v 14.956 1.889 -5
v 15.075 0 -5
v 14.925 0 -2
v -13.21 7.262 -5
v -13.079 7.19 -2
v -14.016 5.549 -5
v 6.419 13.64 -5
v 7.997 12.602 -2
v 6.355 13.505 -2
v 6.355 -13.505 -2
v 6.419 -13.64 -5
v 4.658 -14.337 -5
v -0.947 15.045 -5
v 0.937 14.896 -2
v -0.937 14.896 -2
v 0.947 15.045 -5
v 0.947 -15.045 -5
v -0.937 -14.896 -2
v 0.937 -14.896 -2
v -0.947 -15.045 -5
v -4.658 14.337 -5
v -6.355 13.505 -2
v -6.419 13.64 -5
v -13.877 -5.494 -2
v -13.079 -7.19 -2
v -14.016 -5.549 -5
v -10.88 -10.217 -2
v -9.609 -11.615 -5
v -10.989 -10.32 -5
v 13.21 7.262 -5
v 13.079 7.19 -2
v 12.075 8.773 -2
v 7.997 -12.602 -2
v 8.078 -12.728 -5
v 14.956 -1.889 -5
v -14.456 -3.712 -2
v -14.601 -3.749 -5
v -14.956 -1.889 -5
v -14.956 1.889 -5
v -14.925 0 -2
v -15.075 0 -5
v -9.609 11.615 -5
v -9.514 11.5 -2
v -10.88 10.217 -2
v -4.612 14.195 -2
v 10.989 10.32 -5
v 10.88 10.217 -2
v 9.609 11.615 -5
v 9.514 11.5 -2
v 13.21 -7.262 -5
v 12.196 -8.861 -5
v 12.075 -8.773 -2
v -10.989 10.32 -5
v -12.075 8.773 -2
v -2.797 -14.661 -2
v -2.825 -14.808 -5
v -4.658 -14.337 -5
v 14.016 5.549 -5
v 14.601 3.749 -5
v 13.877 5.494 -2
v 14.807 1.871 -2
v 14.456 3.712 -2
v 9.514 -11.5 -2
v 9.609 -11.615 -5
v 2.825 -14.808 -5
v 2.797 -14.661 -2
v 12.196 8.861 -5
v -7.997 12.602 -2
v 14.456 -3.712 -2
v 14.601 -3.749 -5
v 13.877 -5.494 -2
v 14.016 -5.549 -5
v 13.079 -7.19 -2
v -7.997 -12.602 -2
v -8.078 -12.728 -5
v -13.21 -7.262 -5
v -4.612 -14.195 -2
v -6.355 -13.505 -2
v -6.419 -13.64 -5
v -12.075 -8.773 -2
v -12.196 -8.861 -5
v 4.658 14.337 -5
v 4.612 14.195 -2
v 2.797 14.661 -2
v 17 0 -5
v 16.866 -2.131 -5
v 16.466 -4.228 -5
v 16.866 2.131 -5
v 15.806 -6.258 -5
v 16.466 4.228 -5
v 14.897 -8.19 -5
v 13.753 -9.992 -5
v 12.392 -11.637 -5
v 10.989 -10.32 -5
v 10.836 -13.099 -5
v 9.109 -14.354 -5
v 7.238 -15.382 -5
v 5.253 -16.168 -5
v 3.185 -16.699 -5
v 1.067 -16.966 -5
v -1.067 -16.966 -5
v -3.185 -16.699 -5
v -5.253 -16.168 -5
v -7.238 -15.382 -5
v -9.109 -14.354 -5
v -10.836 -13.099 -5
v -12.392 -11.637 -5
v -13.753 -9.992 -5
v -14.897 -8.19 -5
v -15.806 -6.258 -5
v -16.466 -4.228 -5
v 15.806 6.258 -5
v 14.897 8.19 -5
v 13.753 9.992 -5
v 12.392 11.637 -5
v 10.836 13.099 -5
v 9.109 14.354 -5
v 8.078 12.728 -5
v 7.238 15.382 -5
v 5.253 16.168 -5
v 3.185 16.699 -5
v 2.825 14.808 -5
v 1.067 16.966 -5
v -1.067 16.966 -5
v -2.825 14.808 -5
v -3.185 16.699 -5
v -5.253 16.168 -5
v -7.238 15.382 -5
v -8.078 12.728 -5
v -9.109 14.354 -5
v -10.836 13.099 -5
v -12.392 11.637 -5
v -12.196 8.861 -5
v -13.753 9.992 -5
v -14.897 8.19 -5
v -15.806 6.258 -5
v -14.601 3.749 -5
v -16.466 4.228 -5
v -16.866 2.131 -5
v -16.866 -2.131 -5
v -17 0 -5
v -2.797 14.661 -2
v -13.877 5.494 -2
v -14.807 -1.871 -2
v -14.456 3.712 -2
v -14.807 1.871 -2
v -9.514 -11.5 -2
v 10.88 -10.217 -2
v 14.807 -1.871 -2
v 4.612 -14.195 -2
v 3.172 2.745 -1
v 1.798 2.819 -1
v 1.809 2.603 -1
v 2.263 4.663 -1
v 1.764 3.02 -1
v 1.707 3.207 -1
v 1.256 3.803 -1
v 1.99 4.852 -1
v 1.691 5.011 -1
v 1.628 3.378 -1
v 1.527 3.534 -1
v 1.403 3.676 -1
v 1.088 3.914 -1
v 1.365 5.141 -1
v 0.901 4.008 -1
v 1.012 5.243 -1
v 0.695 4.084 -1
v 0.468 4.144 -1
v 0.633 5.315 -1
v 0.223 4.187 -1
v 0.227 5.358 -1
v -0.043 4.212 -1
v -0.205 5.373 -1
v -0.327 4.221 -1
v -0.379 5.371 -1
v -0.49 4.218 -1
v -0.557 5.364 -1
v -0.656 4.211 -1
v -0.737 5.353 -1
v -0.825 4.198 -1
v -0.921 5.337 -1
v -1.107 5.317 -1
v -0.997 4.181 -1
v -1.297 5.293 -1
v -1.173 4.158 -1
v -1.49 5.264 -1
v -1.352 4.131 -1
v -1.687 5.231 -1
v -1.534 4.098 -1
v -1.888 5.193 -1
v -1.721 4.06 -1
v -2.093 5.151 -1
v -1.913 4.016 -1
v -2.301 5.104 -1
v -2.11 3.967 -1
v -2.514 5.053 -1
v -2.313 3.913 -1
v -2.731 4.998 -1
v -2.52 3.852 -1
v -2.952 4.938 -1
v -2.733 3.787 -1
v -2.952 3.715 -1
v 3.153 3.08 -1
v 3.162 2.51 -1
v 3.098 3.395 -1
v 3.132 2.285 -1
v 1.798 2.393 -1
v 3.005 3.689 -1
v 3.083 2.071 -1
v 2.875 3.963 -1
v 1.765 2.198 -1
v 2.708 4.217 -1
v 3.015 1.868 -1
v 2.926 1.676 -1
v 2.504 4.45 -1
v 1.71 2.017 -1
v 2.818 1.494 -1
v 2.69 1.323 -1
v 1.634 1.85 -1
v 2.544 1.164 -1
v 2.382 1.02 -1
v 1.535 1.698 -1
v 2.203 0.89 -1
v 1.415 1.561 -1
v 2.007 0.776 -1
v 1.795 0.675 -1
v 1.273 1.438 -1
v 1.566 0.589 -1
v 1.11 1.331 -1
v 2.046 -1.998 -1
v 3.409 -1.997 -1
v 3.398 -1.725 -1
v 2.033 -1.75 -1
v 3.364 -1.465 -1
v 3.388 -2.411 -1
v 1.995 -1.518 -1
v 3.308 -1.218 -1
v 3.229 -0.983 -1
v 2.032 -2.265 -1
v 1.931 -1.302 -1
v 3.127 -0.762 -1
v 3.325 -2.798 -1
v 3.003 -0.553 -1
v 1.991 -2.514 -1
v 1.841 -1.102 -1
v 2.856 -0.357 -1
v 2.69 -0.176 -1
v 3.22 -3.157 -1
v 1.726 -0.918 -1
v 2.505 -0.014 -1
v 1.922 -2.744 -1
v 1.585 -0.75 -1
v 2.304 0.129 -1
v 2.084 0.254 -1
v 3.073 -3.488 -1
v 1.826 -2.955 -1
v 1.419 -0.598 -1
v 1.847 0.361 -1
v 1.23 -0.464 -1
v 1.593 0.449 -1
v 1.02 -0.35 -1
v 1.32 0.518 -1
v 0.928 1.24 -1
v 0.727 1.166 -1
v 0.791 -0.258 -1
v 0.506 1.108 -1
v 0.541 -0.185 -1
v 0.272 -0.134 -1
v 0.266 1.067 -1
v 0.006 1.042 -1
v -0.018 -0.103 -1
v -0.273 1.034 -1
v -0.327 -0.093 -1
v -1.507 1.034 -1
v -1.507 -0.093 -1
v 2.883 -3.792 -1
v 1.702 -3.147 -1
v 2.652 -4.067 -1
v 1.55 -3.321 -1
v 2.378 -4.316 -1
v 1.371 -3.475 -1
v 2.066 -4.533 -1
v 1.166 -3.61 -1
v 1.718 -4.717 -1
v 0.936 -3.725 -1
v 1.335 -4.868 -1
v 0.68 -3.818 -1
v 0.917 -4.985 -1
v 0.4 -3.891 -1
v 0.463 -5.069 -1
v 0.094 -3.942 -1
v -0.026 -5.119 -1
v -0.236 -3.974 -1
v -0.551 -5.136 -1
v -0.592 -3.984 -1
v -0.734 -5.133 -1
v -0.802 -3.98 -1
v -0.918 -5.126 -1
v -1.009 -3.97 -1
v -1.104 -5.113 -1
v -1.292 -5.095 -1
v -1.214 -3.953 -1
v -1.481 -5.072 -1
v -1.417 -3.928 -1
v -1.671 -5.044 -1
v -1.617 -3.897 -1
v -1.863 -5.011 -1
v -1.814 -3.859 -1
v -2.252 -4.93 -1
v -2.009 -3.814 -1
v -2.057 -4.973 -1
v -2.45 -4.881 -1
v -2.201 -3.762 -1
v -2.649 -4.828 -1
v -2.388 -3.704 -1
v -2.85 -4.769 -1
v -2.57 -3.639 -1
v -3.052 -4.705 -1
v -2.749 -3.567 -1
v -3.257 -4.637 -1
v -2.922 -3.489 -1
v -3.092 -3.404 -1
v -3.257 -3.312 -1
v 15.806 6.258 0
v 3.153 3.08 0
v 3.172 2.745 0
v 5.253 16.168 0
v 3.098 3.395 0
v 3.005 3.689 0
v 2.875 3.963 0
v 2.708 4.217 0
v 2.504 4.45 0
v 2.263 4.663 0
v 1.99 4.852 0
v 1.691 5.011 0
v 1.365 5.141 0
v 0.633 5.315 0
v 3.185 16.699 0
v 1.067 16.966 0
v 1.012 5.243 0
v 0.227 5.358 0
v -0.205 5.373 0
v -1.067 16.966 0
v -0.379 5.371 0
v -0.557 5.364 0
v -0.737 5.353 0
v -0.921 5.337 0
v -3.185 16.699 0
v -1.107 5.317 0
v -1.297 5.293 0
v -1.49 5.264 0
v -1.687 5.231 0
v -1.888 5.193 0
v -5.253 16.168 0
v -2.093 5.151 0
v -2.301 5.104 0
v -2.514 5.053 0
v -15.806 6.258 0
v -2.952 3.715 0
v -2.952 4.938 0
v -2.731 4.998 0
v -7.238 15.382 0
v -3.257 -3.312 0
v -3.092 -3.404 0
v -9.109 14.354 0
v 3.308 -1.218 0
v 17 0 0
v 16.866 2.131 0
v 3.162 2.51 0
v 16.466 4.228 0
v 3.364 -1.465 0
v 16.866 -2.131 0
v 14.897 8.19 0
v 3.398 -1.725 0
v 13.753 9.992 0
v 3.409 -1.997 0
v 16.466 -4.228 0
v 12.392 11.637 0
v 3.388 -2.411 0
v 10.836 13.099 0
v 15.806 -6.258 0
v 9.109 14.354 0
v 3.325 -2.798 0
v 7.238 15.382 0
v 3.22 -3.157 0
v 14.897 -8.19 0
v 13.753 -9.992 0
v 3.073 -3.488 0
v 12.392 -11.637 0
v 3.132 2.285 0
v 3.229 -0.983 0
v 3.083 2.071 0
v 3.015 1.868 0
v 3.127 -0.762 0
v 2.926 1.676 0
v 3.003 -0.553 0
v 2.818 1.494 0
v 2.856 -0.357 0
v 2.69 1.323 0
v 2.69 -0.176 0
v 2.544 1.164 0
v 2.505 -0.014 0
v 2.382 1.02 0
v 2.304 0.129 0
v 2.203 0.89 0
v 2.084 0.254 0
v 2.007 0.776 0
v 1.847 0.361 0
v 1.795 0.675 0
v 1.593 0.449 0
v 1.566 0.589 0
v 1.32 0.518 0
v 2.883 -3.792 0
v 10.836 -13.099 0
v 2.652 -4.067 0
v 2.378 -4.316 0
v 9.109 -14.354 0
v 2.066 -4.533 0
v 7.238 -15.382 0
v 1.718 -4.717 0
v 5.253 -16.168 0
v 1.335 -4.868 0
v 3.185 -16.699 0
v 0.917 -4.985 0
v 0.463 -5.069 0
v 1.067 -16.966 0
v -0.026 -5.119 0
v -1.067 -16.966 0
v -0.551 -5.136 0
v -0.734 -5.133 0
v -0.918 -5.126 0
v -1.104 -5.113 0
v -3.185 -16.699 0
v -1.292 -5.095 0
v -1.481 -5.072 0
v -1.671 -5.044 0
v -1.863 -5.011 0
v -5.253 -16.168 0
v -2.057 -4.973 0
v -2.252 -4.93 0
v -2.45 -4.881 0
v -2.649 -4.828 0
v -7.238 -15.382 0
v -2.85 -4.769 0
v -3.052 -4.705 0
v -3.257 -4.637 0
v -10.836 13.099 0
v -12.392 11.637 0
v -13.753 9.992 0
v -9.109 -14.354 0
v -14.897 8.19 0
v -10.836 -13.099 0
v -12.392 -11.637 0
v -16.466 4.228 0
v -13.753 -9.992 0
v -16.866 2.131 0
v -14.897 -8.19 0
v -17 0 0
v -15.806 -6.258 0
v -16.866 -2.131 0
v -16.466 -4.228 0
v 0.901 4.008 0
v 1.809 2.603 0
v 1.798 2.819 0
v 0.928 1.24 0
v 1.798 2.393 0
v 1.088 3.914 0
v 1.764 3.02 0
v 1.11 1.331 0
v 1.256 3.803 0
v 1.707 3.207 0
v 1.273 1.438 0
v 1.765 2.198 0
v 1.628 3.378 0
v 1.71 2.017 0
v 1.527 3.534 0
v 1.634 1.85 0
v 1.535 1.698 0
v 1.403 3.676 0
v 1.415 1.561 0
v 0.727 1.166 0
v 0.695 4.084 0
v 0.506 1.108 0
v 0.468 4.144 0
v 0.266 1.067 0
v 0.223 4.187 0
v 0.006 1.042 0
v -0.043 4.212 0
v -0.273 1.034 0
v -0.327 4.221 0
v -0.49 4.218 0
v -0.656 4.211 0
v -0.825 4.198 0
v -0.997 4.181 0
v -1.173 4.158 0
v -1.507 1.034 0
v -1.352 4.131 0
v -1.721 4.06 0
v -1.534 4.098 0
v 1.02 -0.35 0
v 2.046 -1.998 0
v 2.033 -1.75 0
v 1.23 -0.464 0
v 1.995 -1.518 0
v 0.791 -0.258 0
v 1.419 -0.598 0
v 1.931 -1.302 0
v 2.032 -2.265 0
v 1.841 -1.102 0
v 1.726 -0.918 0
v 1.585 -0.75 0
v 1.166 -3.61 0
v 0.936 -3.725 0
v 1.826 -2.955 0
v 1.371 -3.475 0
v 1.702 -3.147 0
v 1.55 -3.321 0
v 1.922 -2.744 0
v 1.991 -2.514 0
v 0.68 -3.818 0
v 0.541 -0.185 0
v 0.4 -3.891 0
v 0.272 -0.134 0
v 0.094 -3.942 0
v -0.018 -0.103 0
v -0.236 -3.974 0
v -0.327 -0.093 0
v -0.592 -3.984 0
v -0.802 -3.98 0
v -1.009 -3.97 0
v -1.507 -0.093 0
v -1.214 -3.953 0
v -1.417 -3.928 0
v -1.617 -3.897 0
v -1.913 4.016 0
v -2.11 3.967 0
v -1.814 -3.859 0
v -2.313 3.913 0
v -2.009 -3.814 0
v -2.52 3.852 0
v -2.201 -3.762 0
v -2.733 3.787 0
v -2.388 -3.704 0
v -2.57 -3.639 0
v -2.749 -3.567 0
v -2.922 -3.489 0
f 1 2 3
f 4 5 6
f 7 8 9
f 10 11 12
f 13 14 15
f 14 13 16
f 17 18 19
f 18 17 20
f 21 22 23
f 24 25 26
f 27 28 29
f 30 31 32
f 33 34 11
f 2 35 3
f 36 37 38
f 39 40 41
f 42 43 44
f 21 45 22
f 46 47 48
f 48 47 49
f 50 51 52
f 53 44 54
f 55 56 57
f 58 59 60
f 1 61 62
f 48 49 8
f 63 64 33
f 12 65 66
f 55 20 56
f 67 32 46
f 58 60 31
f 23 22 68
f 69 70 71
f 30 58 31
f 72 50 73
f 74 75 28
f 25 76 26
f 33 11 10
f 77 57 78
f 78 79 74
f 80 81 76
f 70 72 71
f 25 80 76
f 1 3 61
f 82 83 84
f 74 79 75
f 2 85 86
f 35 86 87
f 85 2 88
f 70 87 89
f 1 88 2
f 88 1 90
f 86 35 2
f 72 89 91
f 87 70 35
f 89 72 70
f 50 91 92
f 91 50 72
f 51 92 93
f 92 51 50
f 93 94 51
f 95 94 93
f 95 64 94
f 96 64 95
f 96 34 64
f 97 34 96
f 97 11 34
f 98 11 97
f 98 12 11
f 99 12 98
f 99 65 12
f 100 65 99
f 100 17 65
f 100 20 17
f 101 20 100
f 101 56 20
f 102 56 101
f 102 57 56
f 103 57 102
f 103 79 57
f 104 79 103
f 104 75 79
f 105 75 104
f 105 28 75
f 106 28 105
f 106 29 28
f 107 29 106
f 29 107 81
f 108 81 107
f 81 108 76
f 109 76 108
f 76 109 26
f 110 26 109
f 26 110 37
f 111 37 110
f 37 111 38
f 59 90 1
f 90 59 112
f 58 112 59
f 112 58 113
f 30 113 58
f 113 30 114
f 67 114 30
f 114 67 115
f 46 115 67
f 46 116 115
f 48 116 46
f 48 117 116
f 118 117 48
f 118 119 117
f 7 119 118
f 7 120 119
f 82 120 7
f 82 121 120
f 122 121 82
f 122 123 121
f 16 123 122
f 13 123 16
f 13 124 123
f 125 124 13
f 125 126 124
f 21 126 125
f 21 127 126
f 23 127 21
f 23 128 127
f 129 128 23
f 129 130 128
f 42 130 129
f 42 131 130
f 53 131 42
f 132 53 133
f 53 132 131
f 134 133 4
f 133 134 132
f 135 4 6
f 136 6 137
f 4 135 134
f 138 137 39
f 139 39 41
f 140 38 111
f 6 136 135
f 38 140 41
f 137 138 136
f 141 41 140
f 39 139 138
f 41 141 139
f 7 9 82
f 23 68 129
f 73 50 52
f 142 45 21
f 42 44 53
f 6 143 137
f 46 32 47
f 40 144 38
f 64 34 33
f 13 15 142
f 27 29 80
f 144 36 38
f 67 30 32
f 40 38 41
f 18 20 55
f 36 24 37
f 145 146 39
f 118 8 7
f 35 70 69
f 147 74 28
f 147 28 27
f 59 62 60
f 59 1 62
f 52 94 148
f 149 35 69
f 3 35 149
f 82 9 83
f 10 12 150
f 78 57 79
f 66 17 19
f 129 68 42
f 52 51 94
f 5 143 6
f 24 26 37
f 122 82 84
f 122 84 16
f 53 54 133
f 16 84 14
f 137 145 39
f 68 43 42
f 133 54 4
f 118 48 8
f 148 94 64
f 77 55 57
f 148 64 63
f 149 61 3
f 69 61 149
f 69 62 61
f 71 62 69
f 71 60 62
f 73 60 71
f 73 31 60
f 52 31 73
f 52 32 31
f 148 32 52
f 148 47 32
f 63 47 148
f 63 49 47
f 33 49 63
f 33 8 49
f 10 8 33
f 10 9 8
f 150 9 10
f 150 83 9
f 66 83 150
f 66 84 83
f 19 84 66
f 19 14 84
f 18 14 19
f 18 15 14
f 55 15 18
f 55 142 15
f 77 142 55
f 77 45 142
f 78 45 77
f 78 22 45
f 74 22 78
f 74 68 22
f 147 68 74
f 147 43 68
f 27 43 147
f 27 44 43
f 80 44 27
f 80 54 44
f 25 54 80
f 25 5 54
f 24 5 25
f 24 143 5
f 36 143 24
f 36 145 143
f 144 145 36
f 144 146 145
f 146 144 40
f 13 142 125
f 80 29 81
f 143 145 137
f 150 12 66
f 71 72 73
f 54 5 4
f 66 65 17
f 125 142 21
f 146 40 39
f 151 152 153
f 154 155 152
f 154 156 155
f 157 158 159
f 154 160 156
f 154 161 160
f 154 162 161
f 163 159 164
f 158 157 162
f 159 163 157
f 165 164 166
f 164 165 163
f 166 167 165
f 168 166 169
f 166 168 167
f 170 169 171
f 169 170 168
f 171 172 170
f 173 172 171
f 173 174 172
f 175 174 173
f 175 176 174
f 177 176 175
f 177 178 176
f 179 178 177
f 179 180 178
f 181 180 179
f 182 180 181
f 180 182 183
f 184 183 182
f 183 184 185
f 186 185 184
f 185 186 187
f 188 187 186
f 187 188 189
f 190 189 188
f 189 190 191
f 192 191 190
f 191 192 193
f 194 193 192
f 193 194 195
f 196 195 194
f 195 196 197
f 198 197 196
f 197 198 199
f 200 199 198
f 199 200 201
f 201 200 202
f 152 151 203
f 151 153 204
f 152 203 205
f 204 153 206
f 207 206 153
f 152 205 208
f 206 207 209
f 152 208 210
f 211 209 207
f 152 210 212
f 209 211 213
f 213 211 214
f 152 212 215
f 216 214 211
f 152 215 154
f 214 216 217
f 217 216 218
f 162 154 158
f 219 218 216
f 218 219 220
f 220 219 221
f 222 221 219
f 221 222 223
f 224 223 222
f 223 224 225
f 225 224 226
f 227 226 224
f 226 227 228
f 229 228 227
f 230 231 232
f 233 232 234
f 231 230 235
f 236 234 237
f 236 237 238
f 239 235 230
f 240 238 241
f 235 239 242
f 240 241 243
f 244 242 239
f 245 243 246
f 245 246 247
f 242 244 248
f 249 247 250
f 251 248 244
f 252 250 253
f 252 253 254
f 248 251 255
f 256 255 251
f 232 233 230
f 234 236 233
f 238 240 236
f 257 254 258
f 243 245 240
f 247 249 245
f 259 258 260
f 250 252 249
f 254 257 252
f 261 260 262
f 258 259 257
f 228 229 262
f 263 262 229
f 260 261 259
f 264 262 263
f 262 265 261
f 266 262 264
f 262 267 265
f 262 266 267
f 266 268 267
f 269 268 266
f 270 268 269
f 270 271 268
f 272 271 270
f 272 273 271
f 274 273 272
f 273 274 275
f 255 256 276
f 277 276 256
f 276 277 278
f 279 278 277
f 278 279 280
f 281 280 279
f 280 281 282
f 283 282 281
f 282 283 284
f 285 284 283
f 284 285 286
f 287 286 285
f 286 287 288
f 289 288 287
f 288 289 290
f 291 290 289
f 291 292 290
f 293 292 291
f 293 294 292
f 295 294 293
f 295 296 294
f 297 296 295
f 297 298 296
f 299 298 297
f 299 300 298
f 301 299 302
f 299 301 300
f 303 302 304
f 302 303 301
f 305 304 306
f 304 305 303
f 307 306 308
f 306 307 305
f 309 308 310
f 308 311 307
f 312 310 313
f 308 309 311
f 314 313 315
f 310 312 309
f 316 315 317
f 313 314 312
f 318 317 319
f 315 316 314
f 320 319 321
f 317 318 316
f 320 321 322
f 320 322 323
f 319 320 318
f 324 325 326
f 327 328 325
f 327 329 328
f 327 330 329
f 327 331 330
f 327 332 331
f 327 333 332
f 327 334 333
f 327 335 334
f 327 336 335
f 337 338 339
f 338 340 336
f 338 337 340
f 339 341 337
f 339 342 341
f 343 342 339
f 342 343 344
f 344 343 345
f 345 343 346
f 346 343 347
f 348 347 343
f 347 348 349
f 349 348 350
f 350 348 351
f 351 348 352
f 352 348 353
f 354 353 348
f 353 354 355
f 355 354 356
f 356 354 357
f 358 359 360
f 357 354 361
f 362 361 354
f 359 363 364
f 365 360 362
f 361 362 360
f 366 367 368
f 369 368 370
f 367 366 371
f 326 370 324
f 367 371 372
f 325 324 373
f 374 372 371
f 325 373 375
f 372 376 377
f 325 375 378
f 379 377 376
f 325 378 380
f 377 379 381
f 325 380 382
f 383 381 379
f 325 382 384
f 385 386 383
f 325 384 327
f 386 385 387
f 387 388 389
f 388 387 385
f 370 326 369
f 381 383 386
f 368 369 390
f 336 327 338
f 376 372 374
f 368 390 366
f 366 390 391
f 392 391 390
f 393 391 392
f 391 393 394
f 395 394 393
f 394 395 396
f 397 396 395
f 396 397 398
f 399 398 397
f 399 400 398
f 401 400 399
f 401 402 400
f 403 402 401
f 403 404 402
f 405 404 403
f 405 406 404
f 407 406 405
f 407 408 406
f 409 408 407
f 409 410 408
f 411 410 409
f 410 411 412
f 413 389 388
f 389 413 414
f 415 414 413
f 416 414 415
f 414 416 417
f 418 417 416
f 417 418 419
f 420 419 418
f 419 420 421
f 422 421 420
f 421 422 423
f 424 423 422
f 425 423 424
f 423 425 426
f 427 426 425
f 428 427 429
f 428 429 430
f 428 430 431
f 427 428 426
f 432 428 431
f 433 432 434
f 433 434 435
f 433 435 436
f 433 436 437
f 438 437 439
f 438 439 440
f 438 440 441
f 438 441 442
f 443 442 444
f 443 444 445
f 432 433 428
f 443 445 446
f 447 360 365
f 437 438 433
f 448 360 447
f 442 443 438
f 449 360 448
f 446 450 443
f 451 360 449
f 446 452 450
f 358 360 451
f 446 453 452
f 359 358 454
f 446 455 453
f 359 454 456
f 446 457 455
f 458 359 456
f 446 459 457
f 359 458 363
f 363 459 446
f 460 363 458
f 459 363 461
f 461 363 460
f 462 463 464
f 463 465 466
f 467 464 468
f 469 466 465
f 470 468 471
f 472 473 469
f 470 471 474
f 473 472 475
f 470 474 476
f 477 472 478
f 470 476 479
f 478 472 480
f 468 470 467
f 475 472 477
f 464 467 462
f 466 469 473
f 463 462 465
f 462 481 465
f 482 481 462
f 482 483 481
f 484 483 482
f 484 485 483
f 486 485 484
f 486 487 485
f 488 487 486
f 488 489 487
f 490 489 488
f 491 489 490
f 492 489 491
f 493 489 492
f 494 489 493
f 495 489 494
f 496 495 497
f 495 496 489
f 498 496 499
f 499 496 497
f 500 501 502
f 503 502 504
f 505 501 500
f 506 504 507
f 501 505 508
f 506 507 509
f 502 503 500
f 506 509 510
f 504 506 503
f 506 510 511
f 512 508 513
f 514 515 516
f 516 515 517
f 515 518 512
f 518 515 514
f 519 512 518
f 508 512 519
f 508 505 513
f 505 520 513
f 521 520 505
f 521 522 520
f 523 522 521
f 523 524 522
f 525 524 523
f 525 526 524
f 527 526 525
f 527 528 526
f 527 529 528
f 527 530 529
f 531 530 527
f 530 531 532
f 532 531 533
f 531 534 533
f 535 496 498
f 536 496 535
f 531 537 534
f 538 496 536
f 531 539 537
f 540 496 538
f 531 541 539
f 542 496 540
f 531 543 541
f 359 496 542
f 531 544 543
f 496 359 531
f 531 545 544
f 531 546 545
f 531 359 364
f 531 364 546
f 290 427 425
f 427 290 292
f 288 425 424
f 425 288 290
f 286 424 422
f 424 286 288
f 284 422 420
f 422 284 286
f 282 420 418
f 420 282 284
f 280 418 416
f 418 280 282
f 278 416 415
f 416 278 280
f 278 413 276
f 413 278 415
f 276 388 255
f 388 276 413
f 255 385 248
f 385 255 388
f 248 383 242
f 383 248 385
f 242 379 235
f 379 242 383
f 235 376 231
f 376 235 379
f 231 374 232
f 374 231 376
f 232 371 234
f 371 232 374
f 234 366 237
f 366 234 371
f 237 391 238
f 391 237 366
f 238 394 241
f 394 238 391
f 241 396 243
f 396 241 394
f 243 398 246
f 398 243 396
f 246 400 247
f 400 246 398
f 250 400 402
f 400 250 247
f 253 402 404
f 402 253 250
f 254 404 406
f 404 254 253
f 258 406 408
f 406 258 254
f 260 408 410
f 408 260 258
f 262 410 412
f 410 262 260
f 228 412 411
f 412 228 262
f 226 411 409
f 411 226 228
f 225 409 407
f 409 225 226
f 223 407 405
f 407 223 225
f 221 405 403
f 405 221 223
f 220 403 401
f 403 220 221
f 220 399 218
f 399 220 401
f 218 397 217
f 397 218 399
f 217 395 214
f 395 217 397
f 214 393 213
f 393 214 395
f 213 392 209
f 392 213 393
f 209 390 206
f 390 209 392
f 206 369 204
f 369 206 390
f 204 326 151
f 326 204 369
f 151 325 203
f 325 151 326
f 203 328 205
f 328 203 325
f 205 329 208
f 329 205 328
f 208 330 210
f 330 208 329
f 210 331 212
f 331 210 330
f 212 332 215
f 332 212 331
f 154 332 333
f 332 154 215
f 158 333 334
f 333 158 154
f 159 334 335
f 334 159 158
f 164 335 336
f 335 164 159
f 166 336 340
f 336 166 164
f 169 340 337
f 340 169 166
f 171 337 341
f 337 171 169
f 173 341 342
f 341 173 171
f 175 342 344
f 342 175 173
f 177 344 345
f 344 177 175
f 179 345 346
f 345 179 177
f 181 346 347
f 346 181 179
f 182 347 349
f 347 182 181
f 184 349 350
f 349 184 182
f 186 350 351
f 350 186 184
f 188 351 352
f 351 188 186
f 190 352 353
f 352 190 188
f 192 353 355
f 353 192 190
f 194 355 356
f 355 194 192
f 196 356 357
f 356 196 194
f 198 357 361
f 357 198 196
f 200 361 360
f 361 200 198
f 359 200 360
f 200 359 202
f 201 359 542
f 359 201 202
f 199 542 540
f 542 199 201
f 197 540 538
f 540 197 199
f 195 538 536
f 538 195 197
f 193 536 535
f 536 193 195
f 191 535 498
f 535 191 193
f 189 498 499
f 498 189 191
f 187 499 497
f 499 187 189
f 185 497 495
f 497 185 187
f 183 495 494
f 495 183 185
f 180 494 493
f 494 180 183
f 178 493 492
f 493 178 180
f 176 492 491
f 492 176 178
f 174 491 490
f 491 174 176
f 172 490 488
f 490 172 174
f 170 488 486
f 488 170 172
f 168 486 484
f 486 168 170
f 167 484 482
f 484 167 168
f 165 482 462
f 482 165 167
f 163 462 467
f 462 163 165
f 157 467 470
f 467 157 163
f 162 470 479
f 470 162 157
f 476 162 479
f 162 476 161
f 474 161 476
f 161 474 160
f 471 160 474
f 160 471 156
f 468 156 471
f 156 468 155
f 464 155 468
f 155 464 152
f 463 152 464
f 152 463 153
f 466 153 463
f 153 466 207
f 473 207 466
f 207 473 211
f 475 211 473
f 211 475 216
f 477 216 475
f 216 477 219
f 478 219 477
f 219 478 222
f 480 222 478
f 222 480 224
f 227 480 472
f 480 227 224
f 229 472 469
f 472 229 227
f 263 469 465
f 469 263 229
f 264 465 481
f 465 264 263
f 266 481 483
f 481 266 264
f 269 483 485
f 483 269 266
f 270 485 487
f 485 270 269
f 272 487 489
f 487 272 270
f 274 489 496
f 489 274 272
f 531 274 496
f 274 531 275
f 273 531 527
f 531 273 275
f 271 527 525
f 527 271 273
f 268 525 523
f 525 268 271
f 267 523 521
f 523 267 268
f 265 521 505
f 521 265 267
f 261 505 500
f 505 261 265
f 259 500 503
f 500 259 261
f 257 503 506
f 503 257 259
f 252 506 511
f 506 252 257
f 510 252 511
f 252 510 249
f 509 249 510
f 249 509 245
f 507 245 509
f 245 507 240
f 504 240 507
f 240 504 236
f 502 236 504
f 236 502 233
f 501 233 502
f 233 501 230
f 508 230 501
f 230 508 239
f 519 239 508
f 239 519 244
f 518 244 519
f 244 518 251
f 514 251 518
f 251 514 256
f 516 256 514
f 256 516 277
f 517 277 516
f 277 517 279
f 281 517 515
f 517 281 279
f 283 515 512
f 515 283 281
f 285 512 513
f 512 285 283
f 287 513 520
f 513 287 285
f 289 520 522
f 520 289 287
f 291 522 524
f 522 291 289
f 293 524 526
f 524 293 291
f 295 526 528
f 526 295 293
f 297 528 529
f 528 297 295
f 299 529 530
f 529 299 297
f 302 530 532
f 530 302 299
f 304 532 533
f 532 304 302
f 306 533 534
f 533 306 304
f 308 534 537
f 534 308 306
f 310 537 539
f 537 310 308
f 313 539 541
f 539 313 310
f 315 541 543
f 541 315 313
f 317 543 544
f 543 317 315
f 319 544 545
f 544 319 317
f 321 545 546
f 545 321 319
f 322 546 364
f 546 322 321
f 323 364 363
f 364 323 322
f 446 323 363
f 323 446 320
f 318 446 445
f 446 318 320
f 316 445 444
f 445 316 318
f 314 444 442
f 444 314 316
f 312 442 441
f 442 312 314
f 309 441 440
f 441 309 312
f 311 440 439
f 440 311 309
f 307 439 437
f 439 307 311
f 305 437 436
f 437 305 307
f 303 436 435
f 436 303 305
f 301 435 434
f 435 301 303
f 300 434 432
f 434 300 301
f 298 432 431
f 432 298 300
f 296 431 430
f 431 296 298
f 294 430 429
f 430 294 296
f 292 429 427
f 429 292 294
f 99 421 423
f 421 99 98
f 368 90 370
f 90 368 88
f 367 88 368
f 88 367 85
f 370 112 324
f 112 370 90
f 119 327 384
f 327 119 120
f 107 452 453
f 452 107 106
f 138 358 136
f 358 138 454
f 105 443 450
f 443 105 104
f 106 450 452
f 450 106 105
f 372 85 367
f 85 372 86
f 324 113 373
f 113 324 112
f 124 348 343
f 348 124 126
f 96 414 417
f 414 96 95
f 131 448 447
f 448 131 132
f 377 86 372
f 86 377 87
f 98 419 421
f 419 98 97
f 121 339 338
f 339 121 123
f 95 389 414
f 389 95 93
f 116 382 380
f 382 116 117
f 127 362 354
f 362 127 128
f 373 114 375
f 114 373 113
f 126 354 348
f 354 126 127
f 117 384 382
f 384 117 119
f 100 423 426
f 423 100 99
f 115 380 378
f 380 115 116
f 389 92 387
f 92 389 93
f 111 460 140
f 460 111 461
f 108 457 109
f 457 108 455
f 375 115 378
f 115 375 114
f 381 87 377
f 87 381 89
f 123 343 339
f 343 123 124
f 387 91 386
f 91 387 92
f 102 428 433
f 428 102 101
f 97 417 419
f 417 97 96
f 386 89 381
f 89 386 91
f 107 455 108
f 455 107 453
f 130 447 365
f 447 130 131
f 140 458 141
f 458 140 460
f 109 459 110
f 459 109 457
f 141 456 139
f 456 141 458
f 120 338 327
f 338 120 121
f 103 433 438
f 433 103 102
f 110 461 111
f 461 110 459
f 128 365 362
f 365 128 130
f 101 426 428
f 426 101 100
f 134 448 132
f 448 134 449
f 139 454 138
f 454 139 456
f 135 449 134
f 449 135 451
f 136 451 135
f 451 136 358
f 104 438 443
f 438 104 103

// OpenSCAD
$fn = 50;

difference() {
	union() {
		translate(v = [0, 0, -5.0]) {
			cylinder(h = 5, r = 17.0);
		}
	}
	union() {
		#translate(v = [0, 0, -5.0]) {
			cylinder(h = 3, r1 = 15.075, r2 = 14.925);
		}
		translate(v = [0, 0, -1]) {
			linear_extrude(height = 1) {
				text(font = "Impact", halign = "center", size = 10, text = "3", valign = "center");
			}
		}
	}
}
